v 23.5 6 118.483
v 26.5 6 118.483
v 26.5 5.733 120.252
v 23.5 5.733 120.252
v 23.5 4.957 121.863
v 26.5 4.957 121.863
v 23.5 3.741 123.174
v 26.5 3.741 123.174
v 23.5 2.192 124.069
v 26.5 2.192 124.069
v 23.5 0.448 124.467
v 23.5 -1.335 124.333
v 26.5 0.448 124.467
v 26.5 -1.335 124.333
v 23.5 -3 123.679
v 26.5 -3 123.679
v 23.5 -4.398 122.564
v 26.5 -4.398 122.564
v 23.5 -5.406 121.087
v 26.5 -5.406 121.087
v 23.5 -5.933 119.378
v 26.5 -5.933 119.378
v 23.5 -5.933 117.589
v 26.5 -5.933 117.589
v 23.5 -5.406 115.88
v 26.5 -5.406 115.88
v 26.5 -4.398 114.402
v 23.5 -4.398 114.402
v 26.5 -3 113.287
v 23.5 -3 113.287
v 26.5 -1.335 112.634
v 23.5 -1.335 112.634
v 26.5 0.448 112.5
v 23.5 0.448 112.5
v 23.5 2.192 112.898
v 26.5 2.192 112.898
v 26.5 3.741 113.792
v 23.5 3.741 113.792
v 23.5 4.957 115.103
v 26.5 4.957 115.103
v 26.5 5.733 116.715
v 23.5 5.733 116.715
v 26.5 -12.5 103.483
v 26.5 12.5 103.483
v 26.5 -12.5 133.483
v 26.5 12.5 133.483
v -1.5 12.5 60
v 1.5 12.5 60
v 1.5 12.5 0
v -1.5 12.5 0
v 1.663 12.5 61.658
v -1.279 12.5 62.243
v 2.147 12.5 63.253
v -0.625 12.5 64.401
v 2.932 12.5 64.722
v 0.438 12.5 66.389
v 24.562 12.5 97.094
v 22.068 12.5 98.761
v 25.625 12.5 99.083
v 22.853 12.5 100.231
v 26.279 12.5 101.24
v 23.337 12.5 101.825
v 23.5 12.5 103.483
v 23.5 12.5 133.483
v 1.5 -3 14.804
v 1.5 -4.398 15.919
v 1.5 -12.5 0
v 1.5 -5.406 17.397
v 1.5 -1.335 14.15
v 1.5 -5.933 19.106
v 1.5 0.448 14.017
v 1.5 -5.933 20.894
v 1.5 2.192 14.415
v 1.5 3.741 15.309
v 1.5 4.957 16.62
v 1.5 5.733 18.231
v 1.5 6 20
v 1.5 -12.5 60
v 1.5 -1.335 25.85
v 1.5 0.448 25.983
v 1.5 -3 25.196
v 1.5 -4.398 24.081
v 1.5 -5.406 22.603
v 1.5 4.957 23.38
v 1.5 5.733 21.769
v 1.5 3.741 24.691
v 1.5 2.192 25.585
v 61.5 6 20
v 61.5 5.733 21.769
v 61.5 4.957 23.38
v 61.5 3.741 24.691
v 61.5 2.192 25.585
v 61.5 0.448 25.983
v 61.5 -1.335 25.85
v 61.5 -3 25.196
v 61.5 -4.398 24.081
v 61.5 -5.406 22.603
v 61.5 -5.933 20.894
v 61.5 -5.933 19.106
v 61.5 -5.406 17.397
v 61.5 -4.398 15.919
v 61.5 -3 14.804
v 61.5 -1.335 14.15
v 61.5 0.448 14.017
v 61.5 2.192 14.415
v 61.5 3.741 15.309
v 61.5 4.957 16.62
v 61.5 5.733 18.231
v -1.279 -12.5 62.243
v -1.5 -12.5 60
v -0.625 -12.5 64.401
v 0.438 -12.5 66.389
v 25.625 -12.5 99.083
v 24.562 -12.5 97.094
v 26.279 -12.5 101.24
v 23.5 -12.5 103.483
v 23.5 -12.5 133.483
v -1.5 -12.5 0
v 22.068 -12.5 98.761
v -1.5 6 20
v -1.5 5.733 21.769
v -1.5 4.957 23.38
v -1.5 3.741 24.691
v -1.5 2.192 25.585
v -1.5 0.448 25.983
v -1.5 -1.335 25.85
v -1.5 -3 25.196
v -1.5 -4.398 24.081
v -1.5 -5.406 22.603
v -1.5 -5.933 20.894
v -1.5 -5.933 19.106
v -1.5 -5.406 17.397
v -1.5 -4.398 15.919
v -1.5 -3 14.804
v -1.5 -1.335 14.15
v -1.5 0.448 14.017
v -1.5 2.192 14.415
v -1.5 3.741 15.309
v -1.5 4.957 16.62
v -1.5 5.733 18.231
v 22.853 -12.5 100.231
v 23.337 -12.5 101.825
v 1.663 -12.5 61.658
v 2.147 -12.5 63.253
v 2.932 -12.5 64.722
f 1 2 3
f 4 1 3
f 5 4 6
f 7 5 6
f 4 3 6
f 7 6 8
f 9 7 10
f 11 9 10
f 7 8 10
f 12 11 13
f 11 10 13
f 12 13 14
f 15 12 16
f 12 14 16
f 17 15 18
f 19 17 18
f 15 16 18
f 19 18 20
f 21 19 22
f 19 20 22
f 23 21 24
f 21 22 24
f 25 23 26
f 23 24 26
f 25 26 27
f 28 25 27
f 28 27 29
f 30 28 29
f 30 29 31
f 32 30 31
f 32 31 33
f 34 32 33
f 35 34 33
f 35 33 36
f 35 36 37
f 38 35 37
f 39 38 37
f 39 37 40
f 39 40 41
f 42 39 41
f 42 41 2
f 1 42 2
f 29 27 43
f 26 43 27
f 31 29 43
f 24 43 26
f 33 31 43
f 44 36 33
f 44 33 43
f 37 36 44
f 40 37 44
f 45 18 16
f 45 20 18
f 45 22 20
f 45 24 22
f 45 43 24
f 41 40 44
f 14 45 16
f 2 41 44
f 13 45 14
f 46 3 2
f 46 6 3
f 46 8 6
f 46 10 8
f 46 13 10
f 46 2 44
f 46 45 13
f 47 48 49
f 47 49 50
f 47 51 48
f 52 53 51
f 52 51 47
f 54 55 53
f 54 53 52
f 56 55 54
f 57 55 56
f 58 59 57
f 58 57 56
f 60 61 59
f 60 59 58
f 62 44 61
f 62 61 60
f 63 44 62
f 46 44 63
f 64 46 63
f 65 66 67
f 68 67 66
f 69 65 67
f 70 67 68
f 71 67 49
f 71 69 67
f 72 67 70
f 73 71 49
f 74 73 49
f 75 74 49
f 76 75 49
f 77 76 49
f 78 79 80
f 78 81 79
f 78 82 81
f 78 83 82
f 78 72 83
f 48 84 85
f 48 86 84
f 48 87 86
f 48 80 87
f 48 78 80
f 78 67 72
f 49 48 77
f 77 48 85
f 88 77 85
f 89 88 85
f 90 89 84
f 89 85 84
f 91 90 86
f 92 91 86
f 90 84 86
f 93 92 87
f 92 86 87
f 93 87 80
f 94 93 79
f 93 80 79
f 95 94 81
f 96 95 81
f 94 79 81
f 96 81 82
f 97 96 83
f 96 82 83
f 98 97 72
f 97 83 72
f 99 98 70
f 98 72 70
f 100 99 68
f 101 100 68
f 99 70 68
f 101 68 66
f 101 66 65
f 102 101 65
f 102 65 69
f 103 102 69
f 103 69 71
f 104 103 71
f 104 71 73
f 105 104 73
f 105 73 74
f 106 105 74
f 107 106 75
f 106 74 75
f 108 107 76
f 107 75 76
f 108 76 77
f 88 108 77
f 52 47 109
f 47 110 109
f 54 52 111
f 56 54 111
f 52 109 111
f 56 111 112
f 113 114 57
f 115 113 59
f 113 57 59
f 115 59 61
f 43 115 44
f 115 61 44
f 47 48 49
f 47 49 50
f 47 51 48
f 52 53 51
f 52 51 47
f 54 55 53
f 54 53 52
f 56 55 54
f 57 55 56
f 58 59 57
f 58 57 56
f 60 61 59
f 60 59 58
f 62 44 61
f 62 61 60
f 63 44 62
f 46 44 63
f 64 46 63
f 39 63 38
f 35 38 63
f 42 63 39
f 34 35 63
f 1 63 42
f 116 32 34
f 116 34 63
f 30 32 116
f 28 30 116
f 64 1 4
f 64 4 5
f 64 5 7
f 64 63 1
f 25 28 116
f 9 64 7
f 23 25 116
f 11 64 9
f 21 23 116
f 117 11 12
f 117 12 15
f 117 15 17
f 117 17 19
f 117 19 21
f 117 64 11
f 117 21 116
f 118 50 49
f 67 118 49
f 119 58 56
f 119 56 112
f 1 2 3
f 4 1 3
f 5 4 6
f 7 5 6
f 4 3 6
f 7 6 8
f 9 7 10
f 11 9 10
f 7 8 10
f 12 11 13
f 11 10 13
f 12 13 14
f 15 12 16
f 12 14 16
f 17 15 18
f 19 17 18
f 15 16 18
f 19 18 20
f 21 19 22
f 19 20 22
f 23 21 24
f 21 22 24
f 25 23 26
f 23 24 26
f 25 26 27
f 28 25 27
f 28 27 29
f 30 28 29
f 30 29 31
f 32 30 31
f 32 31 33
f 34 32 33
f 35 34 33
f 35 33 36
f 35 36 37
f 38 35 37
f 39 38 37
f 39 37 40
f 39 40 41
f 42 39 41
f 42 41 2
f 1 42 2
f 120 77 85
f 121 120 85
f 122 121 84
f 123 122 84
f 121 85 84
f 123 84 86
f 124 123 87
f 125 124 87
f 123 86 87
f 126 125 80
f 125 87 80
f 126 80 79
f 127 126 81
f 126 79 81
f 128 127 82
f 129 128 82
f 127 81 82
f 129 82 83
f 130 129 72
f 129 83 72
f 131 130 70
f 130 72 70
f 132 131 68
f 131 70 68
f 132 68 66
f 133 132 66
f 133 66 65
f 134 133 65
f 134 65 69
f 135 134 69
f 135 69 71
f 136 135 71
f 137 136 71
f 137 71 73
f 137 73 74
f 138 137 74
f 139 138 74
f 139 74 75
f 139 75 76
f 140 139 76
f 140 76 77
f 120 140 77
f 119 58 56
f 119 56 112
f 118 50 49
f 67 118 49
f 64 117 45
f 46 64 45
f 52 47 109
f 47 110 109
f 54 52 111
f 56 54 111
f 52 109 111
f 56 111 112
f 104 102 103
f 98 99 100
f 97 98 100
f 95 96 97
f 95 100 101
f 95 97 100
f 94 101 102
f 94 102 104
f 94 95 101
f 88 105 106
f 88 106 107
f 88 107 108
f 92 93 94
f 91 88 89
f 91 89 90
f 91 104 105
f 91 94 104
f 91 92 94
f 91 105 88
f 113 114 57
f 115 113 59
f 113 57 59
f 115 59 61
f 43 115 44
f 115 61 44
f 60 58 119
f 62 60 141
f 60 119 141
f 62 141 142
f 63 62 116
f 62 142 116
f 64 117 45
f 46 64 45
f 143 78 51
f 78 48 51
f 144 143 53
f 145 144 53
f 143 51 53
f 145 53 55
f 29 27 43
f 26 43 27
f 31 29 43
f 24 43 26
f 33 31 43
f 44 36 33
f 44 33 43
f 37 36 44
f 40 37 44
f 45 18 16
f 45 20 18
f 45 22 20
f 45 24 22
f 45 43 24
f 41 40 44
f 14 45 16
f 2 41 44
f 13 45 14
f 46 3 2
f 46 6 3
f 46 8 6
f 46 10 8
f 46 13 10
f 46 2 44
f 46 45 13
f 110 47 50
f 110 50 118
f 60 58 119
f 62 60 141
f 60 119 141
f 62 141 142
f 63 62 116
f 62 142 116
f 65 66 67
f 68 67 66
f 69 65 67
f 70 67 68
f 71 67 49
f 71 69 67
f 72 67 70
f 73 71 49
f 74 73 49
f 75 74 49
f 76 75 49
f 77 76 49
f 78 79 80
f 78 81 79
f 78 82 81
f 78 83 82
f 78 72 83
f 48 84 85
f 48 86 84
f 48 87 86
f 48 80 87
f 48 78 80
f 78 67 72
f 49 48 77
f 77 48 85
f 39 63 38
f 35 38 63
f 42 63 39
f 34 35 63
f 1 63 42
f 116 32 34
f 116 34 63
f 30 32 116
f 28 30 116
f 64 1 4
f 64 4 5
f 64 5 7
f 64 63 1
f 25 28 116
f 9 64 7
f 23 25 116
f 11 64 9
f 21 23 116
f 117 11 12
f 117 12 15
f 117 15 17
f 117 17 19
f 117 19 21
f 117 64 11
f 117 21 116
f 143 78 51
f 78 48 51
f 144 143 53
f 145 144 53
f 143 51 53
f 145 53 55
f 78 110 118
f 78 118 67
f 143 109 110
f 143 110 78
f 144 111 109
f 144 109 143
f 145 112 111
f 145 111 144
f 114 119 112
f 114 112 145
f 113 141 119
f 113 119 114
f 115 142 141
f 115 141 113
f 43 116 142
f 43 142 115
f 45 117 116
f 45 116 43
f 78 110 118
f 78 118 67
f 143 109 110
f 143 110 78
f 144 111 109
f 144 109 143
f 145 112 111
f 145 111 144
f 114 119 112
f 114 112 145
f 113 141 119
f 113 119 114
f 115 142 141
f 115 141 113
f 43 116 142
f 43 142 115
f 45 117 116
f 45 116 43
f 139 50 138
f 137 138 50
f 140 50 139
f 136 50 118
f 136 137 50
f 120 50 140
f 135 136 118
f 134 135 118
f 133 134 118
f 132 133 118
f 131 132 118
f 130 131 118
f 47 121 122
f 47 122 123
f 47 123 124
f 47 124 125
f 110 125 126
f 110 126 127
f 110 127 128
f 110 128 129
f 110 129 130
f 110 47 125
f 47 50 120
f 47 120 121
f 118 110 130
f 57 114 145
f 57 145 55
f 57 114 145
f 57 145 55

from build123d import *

# Parameters (mm, degrees)
F0_W     = 3
F0_H     = 25
F3_R     = 6
F4_DEPTH = 60
F5_R     = 6
F6_DEPTH = 25
F8_DEPTH = 25
F9_DEPTH = 25


with BuildPart() as f2:
    # F2: sweep along a path in F1
    with BuildLine(Plane.XZ) as f2_path:
        Line((0, 0), (0, 60))
        ThreePointArc((0, 60), (0.430571022, 62.9027623113), (1.6852058072, 65.5555555556))
        Line((1.6852058072, 65.5555555556), (23.3147941928, 97.927759218))
        ThreePointArc((23.3147941928, 97.927759218), (24.569428978, 100.5805524623), (25, 103.4833147735))
        Line((25, 103.4833147735), (25, 133.4833147735))
    # F0 (on Top) → F2 (sweep)
    with BuildSketch(Plane.XY):
        Rectangle(F0_W, F0_H)
    sweep(path=f2_path.line)

    # F3 (on face) → F4 (join)
    with BuildSketch(Plane.YZ.offset(1.5)):
        with Locations((0, 20)):
            Circle(F3_R)
    extrude(amount=F4_DEPTH)

    # F5 (on face) → F6 (cut)
    with BuildSketch(Plane.YZ.offset(26.5)):
        with Locations((0, 118.4833147735)):
            Circle(F5_R)
    extrude(amount=-F6_DEPTH, mode=Mode.SUBTRACT)


with BuildPart() as f7:
    # F7: sweep along a path in F1
    with BuildLine(Plane.XZ) as f7_path:
        Line((0, 0), (0, 60))
        ThreePointArc((0, 60), (0.430571022, 62.9027623113), (1.6852058072, 65.5555555556))
        Line((1.6852058072, 65.5555555556), (23.3147941928, 97.927759218))
        ThreePointArc((23.3147941928, 97.927759218), (24.569428978, 100.5805524623), (25, 103.4833147735))
        Line((25, 103.4833147735), (25, 133.4833147735))
    # F0 (on Top) → F7 (sweep)
    with BuildSketch(Plane.XY):
        Rectangle(F0_W, F0_H)
    sweep(path=f7_path.line)

    # F5 (on face) → F8 (cut)
    with BuildSketch(Plane.YZ.offset(26.5)):
        with Locations((0, 118.4833147735)):
            Circle(F5_R)
    extrude(amount=-F8_DEPTH, mode=Mode.SUBTRACT)

    # F3 (on face) → F9 (cut)
    with BuildSketch(Plane.YZ.offset(1.5)):
        with Locations((0, 20)):
            Circle(F3_R)
    extrude(amount=-F9_DEPTH, mode=Mode.SUBTRACT)


solid = Compound([f2.part, f7.part])
